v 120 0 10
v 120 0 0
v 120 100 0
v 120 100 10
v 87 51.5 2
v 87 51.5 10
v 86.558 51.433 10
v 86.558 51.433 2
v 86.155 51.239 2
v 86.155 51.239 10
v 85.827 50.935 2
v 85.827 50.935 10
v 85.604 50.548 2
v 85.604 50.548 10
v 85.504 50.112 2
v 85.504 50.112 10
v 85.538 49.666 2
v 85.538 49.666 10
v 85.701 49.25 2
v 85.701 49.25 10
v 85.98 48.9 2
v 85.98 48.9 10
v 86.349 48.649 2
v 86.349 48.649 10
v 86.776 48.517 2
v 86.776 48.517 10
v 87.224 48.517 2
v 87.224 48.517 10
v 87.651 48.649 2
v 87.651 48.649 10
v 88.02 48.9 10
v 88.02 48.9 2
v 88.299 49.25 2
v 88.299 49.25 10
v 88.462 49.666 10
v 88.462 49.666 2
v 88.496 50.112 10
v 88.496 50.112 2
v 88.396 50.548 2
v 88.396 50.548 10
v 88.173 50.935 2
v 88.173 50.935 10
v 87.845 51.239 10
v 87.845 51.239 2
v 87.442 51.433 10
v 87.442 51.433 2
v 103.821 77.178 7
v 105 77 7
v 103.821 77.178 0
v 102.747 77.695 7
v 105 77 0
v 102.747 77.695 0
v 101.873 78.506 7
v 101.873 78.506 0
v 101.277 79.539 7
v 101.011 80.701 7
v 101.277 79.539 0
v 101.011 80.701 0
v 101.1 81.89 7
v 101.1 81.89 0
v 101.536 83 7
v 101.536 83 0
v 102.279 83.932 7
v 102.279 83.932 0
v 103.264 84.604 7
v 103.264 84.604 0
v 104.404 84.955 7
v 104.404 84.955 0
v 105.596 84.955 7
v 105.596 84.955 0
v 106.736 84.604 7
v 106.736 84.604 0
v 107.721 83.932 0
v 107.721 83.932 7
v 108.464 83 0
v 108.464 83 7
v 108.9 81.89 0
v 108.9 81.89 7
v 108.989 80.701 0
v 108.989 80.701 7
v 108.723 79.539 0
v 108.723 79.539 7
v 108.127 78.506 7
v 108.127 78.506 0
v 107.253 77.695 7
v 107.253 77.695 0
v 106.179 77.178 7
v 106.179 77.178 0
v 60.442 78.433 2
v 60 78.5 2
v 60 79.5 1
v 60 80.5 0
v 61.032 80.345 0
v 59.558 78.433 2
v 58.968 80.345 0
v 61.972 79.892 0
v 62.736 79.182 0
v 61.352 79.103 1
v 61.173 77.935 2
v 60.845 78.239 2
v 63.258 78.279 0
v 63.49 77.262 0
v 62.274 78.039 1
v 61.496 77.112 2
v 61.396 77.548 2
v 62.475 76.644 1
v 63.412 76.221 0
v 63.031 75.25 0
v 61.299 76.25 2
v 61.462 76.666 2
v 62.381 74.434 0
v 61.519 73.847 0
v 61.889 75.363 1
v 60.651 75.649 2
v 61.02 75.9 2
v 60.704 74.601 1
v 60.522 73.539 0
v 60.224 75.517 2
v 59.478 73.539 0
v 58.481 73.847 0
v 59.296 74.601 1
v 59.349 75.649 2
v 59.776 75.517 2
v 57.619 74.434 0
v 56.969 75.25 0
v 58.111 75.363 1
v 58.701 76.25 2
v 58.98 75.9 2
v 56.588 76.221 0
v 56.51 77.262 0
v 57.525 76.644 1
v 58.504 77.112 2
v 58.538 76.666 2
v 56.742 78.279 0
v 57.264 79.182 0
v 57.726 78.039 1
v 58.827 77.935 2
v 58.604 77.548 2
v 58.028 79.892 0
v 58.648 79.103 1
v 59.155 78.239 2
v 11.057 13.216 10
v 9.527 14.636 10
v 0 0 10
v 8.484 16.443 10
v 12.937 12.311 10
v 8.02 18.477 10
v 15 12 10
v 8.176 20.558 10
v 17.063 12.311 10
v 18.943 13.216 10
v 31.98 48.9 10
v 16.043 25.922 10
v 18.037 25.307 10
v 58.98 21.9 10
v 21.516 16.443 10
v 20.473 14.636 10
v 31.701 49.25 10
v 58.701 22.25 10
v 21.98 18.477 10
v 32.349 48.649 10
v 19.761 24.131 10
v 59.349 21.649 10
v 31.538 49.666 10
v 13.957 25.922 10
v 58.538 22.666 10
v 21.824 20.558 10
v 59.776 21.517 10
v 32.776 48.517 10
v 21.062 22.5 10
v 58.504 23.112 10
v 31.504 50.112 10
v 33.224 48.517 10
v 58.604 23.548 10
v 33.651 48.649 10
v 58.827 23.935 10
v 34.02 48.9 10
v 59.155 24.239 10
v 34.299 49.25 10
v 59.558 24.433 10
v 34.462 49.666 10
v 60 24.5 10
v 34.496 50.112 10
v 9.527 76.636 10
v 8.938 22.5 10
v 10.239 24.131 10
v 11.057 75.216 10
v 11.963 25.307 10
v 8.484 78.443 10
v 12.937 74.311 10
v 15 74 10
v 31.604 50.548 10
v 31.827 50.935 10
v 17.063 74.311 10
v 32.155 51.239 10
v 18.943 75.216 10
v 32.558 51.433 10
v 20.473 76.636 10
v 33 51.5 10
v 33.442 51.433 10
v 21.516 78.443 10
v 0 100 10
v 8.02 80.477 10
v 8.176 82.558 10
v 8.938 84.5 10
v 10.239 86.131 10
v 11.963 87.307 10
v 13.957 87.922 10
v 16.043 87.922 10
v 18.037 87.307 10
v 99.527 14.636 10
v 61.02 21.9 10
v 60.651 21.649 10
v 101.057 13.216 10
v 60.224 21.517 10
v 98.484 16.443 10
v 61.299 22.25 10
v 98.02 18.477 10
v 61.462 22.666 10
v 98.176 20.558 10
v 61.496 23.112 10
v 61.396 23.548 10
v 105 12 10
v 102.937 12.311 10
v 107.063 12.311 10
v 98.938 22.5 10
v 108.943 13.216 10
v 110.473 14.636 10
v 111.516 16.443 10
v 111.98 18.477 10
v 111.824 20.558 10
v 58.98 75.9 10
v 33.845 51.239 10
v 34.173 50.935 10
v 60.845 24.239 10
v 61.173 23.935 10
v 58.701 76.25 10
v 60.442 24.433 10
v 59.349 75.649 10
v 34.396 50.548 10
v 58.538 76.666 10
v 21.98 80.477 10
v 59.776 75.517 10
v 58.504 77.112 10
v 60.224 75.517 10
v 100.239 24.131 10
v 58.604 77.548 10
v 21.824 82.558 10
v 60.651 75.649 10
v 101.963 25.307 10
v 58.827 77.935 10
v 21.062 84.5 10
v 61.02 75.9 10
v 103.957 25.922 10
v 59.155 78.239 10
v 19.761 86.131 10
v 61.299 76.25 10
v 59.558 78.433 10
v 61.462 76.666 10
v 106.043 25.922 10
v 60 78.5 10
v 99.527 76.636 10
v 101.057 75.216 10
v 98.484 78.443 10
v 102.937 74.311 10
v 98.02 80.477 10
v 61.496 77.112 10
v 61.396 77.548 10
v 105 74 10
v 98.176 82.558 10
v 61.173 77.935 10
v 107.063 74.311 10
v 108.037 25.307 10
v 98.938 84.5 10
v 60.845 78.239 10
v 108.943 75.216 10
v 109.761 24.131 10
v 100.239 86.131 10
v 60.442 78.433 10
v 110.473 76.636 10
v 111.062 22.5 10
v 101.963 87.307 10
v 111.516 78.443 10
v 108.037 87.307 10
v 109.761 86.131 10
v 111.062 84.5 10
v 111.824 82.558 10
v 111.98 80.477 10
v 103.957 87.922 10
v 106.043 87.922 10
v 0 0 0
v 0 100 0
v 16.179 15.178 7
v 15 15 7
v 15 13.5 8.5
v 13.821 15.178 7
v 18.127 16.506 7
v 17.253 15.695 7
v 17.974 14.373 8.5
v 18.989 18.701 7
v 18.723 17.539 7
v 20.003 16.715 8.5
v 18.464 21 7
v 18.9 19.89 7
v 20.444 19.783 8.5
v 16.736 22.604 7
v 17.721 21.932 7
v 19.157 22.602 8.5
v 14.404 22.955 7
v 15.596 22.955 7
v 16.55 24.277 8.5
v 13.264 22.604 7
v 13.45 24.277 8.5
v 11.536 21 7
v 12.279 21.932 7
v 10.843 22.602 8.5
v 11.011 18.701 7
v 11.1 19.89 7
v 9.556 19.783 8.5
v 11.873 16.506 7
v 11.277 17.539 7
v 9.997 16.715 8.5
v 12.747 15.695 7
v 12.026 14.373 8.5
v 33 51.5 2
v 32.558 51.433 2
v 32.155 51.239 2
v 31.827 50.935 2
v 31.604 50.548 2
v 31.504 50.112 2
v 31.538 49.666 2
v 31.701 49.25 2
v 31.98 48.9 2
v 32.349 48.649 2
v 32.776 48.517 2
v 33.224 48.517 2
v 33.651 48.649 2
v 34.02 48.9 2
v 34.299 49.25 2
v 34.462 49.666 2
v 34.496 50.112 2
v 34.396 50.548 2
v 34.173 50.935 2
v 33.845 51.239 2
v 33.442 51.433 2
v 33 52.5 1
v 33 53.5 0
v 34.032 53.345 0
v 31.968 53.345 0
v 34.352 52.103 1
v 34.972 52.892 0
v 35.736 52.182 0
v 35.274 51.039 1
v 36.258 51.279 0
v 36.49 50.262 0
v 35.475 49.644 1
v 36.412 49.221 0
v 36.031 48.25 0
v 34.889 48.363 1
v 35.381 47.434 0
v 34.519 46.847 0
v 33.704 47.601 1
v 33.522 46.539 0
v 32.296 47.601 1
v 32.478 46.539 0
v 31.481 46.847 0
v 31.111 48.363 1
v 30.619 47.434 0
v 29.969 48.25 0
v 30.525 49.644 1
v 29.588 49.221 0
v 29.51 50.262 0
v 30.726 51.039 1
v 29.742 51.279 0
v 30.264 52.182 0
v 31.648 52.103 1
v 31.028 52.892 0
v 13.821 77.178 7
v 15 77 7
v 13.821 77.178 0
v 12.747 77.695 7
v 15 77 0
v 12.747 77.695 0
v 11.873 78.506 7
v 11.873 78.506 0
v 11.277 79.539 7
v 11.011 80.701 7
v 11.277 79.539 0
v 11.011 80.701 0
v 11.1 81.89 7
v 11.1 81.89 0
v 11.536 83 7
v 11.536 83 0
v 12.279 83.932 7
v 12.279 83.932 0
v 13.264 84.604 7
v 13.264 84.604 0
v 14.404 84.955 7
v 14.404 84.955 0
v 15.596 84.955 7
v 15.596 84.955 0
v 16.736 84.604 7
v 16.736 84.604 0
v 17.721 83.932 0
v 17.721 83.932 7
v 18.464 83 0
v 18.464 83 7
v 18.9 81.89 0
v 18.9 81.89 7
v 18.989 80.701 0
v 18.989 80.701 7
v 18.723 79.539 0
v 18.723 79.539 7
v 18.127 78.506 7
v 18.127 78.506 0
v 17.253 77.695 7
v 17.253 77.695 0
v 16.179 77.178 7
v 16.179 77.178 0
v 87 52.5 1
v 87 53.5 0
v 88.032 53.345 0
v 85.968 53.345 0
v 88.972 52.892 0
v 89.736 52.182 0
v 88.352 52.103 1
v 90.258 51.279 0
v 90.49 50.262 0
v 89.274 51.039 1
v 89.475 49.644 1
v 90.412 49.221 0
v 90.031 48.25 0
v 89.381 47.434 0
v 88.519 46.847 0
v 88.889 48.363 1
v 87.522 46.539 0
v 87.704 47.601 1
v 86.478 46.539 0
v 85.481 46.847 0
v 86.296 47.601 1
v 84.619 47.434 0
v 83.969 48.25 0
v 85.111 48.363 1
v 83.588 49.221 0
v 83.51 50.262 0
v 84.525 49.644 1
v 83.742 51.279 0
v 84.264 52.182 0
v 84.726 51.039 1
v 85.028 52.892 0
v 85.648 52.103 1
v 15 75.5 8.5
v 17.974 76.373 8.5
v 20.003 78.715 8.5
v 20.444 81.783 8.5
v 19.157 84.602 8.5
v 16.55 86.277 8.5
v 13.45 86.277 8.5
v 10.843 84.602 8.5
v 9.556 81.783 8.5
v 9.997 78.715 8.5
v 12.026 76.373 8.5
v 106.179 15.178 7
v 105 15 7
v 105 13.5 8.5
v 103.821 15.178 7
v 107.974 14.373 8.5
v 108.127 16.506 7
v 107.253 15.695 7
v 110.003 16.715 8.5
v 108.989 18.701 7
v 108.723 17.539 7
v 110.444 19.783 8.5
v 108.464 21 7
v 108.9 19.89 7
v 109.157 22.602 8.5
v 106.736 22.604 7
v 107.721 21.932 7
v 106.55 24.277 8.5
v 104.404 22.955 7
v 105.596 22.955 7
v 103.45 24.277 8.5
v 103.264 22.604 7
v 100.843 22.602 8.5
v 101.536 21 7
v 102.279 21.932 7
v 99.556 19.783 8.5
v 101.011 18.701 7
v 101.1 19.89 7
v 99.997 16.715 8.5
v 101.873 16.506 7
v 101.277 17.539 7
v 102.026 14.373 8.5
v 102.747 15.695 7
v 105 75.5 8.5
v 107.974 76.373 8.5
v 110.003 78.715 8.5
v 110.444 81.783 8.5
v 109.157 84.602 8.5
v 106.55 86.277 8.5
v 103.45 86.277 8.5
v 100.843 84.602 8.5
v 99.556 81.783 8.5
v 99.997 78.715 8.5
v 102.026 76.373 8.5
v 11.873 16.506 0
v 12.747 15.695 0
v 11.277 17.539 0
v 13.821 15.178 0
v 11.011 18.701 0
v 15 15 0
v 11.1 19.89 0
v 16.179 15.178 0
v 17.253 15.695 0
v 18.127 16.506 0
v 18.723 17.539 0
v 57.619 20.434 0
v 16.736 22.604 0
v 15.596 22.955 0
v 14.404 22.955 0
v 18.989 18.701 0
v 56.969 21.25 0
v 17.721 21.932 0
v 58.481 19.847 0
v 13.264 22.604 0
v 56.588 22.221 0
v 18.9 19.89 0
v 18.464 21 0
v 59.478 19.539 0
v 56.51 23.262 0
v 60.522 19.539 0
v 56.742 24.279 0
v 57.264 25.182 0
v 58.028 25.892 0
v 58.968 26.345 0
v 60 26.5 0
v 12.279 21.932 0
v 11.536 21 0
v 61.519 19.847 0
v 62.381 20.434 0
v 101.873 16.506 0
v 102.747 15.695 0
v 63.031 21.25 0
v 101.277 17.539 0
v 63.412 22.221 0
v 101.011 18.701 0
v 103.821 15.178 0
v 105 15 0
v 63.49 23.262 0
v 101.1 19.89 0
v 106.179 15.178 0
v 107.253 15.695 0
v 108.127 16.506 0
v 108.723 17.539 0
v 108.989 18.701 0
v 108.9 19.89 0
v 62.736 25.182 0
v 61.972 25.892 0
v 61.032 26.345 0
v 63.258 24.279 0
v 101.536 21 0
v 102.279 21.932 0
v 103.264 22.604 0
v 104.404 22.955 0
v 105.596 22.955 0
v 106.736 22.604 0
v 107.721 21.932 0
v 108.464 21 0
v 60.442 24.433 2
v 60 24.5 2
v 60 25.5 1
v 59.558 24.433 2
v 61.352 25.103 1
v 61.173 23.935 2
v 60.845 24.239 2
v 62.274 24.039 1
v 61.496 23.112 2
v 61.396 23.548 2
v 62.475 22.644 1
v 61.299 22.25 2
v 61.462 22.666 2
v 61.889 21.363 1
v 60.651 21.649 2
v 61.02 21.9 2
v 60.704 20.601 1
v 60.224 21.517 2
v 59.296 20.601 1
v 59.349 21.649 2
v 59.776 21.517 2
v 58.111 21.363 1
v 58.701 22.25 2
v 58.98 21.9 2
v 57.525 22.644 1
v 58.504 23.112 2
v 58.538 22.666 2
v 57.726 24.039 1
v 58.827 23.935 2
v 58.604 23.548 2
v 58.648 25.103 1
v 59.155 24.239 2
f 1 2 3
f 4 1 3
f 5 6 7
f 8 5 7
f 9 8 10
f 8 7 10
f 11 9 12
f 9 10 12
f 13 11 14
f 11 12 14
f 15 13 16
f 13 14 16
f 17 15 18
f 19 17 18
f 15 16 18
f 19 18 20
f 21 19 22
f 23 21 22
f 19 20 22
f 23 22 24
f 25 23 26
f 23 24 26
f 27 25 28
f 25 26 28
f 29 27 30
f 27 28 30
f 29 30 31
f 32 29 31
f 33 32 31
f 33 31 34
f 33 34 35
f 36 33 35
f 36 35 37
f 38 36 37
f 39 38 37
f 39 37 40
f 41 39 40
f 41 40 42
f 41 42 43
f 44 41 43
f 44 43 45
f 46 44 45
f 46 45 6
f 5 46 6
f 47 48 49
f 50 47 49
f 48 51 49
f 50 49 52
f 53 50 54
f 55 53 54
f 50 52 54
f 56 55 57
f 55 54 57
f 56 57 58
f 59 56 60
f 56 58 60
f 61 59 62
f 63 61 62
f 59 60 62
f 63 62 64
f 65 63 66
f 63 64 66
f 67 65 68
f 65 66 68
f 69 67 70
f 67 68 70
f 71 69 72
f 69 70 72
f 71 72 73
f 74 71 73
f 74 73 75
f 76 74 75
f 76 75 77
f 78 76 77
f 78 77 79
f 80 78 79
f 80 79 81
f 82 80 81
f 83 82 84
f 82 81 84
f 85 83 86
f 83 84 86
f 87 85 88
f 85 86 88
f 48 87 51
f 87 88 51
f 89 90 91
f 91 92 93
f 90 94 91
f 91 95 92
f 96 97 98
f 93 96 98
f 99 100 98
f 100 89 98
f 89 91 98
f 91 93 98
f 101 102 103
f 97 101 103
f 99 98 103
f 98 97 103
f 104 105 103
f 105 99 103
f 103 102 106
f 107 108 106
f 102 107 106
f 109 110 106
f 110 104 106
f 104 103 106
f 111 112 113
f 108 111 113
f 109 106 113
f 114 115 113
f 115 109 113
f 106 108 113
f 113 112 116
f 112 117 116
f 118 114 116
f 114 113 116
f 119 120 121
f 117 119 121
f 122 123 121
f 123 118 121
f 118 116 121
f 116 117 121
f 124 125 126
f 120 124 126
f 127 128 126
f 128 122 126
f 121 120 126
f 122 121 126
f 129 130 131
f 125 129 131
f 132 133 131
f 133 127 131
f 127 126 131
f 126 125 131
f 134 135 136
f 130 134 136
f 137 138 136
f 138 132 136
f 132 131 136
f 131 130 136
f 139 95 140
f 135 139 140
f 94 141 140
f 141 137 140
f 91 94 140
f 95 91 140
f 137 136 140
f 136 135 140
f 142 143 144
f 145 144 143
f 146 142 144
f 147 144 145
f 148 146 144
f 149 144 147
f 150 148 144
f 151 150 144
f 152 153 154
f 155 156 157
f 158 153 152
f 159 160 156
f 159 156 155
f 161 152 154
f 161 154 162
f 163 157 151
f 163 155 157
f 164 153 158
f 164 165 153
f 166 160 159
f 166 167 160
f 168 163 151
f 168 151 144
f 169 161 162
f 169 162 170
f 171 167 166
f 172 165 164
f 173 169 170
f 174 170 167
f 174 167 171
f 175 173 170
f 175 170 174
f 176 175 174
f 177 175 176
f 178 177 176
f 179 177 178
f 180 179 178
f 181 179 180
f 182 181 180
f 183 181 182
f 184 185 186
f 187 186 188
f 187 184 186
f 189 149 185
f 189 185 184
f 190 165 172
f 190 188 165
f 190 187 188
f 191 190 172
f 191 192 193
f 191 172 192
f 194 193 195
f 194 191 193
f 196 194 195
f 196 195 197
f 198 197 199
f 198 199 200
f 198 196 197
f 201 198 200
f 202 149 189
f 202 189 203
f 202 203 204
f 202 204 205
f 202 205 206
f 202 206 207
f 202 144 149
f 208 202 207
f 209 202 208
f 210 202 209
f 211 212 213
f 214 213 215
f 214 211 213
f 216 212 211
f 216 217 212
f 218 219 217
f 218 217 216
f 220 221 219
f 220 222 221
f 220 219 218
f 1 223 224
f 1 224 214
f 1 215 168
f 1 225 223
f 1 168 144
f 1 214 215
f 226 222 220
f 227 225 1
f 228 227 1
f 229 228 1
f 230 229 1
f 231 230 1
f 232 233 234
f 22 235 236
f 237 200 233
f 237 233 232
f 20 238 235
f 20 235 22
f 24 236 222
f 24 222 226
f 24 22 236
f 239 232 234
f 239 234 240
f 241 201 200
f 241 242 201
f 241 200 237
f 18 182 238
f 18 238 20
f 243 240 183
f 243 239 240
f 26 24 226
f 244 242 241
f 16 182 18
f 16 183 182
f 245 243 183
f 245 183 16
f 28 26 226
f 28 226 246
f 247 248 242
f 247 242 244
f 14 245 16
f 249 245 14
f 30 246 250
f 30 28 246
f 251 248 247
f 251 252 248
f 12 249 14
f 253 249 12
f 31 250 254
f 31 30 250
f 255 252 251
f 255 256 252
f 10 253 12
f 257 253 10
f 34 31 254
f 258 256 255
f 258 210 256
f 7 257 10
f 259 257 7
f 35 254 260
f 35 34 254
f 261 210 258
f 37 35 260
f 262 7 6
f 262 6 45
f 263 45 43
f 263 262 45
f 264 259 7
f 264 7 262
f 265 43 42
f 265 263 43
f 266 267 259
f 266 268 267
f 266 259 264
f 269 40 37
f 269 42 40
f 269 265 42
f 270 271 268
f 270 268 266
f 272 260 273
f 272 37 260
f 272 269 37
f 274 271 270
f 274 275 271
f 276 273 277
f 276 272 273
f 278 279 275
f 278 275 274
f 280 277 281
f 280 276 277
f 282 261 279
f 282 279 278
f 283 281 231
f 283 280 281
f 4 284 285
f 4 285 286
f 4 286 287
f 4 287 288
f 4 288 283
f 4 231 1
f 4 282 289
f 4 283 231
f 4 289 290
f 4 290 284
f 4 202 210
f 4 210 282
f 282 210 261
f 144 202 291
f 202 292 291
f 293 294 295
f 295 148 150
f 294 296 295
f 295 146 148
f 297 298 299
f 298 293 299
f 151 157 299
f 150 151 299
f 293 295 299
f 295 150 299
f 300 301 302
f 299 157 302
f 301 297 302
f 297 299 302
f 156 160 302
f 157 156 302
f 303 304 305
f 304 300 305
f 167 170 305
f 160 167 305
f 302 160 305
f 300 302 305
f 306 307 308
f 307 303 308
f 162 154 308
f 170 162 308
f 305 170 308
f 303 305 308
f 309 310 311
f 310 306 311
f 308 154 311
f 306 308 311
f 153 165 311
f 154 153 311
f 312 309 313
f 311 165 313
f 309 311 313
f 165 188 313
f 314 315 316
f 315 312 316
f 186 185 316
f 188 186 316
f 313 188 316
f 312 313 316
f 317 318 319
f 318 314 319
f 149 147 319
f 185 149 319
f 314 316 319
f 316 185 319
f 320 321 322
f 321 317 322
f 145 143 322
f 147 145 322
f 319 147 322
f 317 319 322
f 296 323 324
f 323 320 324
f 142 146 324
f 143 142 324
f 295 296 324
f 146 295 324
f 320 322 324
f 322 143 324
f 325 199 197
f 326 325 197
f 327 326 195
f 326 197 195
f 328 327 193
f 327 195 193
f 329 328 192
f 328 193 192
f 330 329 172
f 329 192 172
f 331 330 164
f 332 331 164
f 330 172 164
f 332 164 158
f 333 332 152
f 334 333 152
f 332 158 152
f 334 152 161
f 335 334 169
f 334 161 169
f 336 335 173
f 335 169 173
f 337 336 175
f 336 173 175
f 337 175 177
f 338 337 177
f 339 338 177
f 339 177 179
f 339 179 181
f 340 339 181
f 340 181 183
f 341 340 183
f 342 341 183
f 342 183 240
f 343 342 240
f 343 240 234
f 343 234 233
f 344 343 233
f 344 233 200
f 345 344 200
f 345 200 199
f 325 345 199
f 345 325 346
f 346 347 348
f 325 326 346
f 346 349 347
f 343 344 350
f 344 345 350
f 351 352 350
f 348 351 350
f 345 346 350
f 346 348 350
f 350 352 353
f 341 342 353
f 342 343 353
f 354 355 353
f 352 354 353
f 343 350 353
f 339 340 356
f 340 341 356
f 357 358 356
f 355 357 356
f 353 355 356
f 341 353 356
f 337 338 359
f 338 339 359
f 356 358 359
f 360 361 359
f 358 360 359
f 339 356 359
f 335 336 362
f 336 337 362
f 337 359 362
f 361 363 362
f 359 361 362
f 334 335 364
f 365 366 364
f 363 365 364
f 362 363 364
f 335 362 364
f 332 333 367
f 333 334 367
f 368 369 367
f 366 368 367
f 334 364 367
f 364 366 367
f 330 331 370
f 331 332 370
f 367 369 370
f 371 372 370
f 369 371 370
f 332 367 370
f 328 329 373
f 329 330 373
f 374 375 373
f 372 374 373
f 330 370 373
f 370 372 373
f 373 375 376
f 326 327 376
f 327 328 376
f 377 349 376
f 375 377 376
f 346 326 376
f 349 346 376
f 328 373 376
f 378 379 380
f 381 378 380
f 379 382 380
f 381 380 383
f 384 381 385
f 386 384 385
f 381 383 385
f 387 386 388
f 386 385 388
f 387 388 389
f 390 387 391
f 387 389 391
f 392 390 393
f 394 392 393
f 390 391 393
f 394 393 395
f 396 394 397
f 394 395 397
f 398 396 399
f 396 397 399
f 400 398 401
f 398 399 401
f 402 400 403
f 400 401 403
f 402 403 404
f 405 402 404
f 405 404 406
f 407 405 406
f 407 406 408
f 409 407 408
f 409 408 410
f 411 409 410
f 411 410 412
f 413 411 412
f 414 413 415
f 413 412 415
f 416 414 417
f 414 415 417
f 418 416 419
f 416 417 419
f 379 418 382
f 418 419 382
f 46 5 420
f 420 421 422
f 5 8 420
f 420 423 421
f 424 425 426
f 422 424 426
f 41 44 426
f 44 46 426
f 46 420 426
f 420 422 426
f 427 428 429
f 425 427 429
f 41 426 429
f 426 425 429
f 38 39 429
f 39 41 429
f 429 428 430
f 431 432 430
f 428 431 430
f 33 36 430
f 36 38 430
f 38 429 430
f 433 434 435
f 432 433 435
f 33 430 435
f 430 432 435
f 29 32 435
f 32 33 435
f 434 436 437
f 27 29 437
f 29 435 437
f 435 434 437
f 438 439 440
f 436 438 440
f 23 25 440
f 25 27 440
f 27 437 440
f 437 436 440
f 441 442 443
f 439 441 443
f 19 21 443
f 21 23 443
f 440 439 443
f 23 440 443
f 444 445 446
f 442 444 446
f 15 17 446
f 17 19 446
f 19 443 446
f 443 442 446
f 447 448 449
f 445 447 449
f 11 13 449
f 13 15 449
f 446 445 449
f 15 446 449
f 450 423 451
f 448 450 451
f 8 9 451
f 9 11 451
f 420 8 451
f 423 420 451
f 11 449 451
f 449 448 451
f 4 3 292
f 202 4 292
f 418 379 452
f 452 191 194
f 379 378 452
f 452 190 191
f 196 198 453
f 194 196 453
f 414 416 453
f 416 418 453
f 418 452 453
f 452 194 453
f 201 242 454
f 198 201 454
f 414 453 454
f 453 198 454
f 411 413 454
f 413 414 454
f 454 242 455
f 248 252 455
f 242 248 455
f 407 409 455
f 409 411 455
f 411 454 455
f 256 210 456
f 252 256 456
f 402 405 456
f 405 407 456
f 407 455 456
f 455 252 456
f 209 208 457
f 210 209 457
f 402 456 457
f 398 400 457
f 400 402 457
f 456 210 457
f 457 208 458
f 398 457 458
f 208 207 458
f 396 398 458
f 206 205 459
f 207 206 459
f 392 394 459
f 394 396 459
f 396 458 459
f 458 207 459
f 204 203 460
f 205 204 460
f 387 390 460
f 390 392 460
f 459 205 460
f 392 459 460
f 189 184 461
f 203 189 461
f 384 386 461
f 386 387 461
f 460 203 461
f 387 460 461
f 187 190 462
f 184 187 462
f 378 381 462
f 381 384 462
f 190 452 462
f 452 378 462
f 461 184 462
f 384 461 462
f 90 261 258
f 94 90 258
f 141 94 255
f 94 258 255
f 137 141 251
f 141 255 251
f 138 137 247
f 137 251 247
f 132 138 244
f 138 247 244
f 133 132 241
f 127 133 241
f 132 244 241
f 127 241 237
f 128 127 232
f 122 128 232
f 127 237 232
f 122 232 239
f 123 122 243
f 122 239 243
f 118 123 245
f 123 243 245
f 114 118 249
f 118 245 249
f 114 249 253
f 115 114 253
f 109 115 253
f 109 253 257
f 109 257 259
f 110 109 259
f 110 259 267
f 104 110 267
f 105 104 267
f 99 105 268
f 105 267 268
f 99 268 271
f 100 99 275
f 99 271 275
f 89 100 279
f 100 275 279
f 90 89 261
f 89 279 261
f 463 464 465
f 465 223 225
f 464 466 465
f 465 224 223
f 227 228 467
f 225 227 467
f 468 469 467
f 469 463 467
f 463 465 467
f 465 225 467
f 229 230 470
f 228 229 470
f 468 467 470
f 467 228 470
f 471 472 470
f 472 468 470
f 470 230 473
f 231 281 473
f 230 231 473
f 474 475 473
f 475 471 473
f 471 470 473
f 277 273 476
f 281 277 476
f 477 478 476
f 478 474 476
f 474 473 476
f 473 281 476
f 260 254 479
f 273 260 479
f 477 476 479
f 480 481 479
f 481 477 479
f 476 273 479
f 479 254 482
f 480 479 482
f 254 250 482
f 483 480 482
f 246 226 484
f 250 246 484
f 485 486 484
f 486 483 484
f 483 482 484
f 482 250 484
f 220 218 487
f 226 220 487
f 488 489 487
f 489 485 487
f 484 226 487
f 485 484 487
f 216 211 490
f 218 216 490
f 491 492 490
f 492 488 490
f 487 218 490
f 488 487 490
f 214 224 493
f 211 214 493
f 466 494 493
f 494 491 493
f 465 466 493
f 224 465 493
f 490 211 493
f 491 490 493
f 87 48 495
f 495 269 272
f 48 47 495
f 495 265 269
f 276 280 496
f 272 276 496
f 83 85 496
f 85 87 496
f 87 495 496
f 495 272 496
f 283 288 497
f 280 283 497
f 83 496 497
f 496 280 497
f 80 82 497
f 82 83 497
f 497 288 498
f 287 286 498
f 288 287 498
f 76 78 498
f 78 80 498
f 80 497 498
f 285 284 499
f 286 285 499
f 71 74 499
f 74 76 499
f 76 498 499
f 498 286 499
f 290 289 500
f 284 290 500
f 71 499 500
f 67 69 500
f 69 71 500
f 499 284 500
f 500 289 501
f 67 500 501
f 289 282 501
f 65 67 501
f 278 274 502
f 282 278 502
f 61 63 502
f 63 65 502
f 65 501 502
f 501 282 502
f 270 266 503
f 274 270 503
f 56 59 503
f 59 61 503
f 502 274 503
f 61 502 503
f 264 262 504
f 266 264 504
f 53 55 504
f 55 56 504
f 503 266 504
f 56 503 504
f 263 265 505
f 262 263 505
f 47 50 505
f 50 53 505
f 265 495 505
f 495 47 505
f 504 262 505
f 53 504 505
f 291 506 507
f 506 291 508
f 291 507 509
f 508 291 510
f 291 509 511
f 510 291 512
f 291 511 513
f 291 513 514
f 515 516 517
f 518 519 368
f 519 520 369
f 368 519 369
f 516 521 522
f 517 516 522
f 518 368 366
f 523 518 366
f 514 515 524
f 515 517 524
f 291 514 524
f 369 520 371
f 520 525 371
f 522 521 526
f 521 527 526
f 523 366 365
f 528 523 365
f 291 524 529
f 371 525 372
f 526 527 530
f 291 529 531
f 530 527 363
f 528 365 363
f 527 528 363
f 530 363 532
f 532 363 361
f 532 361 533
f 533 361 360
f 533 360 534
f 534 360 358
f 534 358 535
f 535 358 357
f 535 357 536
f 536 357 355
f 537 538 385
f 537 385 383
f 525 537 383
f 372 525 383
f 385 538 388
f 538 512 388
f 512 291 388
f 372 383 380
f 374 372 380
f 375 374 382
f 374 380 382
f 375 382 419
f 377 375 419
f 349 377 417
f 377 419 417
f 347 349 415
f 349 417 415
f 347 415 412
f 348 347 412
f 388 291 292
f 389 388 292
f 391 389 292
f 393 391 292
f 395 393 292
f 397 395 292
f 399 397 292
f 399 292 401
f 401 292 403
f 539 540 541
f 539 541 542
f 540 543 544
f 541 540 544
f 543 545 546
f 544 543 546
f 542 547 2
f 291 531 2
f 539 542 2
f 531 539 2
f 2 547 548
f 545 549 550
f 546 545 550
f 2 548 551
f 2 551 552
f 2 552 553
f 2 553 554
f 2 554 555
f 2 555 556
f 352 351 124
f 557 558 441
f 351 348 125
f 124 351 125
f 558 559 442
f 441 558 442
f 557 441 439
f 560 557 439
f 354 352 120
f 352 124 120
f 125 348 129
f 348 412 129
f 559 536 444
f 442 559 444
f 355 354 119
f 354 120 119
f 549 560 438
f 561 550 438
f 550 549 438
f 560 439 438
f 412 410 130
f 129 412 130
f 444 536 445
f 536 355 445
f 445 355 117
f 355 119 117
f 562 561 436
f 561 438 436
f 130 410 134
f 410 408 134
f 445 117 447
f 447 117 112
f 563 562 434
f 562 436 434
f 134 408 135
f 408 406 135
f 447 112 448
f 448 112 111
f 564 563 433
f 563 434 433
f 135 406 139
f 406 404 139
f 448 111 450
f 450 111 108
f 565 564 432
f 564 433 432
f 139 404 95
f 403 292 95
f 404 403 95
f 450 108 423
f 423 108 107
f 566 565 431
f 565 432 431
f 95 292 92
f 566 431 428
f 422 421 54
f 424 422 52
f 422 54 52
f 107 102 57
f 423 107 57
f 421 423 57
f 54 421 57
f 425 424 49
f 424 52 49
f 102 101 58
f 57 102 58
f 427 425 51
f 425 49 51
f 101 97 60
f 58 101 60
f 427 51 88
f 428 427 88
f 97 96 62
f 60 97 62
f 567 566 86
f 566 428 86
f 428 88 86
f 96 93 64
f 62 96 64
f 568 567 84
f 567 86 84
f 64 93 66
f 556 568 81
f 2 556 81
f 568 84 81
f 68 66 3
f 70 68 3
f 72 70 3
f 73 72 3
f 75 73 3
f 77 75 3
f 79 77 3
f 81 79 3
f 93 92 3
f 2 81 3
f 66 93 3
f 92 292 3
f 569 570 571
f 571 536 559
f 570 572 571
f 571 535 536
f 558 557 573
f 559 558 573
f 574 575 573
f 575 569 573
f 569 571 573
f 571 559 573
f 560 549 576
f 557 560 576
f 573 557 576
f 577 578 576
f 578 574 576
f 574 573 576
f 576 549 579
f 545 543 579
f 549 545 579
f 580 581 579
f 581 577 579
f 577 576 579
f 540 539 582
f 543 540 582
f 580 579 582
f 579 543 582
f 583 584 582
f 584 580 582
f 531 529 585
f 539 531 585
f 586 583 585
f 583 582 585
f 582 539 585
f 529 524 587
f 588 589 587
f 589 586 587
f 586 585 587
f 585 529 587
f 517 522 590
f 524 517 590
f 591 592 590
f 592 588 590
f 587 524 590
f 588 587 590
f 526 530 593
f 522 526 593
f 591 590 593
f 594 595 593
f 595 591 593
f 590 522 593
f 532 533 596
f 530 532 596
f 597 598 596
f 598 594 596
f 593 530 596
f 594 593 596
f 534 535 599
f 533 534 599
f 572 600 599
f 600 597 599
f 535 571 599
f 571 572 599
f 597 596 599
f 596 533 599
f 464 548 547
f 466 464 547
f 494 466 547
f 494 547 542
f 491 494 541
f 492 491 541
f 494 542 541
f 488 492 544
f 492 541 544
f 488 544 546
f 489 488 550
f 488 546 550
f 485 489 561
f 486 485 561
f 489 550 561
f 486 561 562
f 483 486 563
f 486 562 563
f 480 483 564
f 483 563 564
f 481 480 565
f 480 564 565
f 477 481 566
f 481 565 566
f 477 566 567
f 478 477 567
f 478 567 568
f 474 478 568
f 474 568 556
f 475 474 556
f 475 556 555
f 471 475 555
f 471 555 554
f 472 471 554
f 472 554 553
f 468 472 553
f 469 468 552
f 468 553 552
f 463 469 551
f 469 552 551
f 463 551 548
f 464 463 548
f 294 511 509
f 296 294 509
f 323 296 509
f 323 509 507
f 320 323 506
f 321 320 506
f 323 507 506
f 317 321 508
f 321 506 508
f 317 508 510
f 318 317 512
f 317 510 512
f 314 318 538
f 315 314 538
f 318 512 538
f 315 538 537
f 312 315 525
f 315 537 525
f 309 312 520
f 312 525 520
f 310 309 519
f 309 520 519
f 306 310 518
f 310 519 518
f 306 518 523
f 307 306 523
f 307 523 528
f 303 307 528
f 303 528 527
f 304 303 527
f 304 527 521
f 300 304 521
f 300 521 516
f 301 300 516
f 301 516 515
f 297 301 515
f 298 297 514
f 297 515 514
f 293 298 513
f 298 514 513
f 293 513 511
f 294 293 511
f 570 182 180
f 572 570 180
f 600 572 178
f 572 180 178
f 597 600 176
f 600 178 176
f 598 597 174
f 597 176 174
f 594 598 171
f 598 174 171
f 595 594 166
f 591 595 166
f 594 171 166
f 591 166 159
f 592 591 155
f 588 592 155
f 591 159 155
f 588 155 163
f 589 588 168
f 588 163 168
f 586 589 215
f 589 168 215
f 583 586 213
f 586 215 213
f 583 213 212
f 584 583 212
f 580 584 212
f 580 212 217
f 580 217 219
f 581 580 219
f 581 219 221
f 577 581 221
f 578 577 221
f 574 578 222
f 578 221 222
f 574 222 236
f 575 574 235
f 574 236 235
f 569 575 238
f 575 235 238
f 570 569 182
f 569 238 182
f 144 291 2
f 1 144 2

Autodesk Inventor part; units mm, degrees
ref_plane "YZ Plane" through (0, 0, 0) normal (1, 0, 0) x (0, 1, 0)
ref_plane "XZ Plane" through (0, 0, 0) normal (0, 1, 0) x (-1, 0, 0)
ref_plane "XY Plane" through (0, 0, 0) normal (0, 0, 1) x (1, 0, 0)
sketch "Sketch1" plane through (0, 0, 0) normal (0, 0, 1) x (1, 0, 0)
  line L0 (0, 0) -> (120, 0)
  line L1 (120, 0) -> (120, 100)
  line L2 (120, 100) -> (0, 100)
  line L3 (0, 100) -> (0, 0)
  dimension "d0" = 120
  dimension "d1" = 100
extrude "Extrusion1" add sketch "Sketch1" along normal blind 10
sketch "Sketch2" plane through (0, 0, 10) normal (0, 0, 1) x (1, 0, 0)
  line L0 (15, 19) -> (105, 19) construction
  line L1 (105, 19) -> (105, 81) construction
  line L2 (105, 81) -> (15, 81) construction
  line L3 (15, 81) -> (15, 19) construction
  circle A0 centre (60, 50) radius 8 construction
  line L4 (15, 19) -> (105, 81) construction
  line L5 (105, 19) -> (15, 81) construction
  point P0 (0, 0)
  dimension "d5" = 90
  dimension "d6" = 62
hole "Hole1" at (15, 81, 10) at (105, 81, 10) at (105, 19, 10) at (15, 19, 10) direction (0, 0, -1) diameter 8 end through all
chamfer "Chamfer1" distance 3 angle 45 1 edges at (15, 85, 10)
chamfer "Chamfer2" distance 3 angle 45 3 edges at (105, 85, 10) (105, 23, 10) (15, 23, 10)
sketch "Sketch3" plane through (0, 0, 0) normal (0, 0, -1) x (-1, 0, 0)
  circle A0 centre (-60, 50) radius 8 construction
  circle A1 centre (-60, 50) radius 27 construction
  point P0 (0, 0)
  point P1 (-60, 77)
  point P2 (-87, 50)
  point P3 (-60, 23)
  point P4 (-33, 50)
  dimension "d20" = 54
  dimension "d23" = 360
hole "Hole2" at (60, 77, 0) at (87, 50, 0) at (60, 23, 0) at (33, 50, 0) direction (0, 0, 1) diameter 3 end through all
chamfer "Chamfer3" distance 2 angle 45 4 edges at (60, 75.5, 0) (33, 48.5, 0) (60, 21.5, 0) (87, 48.5, 0)
properties part number "mounting_plate" material "Aluminum 6061"
